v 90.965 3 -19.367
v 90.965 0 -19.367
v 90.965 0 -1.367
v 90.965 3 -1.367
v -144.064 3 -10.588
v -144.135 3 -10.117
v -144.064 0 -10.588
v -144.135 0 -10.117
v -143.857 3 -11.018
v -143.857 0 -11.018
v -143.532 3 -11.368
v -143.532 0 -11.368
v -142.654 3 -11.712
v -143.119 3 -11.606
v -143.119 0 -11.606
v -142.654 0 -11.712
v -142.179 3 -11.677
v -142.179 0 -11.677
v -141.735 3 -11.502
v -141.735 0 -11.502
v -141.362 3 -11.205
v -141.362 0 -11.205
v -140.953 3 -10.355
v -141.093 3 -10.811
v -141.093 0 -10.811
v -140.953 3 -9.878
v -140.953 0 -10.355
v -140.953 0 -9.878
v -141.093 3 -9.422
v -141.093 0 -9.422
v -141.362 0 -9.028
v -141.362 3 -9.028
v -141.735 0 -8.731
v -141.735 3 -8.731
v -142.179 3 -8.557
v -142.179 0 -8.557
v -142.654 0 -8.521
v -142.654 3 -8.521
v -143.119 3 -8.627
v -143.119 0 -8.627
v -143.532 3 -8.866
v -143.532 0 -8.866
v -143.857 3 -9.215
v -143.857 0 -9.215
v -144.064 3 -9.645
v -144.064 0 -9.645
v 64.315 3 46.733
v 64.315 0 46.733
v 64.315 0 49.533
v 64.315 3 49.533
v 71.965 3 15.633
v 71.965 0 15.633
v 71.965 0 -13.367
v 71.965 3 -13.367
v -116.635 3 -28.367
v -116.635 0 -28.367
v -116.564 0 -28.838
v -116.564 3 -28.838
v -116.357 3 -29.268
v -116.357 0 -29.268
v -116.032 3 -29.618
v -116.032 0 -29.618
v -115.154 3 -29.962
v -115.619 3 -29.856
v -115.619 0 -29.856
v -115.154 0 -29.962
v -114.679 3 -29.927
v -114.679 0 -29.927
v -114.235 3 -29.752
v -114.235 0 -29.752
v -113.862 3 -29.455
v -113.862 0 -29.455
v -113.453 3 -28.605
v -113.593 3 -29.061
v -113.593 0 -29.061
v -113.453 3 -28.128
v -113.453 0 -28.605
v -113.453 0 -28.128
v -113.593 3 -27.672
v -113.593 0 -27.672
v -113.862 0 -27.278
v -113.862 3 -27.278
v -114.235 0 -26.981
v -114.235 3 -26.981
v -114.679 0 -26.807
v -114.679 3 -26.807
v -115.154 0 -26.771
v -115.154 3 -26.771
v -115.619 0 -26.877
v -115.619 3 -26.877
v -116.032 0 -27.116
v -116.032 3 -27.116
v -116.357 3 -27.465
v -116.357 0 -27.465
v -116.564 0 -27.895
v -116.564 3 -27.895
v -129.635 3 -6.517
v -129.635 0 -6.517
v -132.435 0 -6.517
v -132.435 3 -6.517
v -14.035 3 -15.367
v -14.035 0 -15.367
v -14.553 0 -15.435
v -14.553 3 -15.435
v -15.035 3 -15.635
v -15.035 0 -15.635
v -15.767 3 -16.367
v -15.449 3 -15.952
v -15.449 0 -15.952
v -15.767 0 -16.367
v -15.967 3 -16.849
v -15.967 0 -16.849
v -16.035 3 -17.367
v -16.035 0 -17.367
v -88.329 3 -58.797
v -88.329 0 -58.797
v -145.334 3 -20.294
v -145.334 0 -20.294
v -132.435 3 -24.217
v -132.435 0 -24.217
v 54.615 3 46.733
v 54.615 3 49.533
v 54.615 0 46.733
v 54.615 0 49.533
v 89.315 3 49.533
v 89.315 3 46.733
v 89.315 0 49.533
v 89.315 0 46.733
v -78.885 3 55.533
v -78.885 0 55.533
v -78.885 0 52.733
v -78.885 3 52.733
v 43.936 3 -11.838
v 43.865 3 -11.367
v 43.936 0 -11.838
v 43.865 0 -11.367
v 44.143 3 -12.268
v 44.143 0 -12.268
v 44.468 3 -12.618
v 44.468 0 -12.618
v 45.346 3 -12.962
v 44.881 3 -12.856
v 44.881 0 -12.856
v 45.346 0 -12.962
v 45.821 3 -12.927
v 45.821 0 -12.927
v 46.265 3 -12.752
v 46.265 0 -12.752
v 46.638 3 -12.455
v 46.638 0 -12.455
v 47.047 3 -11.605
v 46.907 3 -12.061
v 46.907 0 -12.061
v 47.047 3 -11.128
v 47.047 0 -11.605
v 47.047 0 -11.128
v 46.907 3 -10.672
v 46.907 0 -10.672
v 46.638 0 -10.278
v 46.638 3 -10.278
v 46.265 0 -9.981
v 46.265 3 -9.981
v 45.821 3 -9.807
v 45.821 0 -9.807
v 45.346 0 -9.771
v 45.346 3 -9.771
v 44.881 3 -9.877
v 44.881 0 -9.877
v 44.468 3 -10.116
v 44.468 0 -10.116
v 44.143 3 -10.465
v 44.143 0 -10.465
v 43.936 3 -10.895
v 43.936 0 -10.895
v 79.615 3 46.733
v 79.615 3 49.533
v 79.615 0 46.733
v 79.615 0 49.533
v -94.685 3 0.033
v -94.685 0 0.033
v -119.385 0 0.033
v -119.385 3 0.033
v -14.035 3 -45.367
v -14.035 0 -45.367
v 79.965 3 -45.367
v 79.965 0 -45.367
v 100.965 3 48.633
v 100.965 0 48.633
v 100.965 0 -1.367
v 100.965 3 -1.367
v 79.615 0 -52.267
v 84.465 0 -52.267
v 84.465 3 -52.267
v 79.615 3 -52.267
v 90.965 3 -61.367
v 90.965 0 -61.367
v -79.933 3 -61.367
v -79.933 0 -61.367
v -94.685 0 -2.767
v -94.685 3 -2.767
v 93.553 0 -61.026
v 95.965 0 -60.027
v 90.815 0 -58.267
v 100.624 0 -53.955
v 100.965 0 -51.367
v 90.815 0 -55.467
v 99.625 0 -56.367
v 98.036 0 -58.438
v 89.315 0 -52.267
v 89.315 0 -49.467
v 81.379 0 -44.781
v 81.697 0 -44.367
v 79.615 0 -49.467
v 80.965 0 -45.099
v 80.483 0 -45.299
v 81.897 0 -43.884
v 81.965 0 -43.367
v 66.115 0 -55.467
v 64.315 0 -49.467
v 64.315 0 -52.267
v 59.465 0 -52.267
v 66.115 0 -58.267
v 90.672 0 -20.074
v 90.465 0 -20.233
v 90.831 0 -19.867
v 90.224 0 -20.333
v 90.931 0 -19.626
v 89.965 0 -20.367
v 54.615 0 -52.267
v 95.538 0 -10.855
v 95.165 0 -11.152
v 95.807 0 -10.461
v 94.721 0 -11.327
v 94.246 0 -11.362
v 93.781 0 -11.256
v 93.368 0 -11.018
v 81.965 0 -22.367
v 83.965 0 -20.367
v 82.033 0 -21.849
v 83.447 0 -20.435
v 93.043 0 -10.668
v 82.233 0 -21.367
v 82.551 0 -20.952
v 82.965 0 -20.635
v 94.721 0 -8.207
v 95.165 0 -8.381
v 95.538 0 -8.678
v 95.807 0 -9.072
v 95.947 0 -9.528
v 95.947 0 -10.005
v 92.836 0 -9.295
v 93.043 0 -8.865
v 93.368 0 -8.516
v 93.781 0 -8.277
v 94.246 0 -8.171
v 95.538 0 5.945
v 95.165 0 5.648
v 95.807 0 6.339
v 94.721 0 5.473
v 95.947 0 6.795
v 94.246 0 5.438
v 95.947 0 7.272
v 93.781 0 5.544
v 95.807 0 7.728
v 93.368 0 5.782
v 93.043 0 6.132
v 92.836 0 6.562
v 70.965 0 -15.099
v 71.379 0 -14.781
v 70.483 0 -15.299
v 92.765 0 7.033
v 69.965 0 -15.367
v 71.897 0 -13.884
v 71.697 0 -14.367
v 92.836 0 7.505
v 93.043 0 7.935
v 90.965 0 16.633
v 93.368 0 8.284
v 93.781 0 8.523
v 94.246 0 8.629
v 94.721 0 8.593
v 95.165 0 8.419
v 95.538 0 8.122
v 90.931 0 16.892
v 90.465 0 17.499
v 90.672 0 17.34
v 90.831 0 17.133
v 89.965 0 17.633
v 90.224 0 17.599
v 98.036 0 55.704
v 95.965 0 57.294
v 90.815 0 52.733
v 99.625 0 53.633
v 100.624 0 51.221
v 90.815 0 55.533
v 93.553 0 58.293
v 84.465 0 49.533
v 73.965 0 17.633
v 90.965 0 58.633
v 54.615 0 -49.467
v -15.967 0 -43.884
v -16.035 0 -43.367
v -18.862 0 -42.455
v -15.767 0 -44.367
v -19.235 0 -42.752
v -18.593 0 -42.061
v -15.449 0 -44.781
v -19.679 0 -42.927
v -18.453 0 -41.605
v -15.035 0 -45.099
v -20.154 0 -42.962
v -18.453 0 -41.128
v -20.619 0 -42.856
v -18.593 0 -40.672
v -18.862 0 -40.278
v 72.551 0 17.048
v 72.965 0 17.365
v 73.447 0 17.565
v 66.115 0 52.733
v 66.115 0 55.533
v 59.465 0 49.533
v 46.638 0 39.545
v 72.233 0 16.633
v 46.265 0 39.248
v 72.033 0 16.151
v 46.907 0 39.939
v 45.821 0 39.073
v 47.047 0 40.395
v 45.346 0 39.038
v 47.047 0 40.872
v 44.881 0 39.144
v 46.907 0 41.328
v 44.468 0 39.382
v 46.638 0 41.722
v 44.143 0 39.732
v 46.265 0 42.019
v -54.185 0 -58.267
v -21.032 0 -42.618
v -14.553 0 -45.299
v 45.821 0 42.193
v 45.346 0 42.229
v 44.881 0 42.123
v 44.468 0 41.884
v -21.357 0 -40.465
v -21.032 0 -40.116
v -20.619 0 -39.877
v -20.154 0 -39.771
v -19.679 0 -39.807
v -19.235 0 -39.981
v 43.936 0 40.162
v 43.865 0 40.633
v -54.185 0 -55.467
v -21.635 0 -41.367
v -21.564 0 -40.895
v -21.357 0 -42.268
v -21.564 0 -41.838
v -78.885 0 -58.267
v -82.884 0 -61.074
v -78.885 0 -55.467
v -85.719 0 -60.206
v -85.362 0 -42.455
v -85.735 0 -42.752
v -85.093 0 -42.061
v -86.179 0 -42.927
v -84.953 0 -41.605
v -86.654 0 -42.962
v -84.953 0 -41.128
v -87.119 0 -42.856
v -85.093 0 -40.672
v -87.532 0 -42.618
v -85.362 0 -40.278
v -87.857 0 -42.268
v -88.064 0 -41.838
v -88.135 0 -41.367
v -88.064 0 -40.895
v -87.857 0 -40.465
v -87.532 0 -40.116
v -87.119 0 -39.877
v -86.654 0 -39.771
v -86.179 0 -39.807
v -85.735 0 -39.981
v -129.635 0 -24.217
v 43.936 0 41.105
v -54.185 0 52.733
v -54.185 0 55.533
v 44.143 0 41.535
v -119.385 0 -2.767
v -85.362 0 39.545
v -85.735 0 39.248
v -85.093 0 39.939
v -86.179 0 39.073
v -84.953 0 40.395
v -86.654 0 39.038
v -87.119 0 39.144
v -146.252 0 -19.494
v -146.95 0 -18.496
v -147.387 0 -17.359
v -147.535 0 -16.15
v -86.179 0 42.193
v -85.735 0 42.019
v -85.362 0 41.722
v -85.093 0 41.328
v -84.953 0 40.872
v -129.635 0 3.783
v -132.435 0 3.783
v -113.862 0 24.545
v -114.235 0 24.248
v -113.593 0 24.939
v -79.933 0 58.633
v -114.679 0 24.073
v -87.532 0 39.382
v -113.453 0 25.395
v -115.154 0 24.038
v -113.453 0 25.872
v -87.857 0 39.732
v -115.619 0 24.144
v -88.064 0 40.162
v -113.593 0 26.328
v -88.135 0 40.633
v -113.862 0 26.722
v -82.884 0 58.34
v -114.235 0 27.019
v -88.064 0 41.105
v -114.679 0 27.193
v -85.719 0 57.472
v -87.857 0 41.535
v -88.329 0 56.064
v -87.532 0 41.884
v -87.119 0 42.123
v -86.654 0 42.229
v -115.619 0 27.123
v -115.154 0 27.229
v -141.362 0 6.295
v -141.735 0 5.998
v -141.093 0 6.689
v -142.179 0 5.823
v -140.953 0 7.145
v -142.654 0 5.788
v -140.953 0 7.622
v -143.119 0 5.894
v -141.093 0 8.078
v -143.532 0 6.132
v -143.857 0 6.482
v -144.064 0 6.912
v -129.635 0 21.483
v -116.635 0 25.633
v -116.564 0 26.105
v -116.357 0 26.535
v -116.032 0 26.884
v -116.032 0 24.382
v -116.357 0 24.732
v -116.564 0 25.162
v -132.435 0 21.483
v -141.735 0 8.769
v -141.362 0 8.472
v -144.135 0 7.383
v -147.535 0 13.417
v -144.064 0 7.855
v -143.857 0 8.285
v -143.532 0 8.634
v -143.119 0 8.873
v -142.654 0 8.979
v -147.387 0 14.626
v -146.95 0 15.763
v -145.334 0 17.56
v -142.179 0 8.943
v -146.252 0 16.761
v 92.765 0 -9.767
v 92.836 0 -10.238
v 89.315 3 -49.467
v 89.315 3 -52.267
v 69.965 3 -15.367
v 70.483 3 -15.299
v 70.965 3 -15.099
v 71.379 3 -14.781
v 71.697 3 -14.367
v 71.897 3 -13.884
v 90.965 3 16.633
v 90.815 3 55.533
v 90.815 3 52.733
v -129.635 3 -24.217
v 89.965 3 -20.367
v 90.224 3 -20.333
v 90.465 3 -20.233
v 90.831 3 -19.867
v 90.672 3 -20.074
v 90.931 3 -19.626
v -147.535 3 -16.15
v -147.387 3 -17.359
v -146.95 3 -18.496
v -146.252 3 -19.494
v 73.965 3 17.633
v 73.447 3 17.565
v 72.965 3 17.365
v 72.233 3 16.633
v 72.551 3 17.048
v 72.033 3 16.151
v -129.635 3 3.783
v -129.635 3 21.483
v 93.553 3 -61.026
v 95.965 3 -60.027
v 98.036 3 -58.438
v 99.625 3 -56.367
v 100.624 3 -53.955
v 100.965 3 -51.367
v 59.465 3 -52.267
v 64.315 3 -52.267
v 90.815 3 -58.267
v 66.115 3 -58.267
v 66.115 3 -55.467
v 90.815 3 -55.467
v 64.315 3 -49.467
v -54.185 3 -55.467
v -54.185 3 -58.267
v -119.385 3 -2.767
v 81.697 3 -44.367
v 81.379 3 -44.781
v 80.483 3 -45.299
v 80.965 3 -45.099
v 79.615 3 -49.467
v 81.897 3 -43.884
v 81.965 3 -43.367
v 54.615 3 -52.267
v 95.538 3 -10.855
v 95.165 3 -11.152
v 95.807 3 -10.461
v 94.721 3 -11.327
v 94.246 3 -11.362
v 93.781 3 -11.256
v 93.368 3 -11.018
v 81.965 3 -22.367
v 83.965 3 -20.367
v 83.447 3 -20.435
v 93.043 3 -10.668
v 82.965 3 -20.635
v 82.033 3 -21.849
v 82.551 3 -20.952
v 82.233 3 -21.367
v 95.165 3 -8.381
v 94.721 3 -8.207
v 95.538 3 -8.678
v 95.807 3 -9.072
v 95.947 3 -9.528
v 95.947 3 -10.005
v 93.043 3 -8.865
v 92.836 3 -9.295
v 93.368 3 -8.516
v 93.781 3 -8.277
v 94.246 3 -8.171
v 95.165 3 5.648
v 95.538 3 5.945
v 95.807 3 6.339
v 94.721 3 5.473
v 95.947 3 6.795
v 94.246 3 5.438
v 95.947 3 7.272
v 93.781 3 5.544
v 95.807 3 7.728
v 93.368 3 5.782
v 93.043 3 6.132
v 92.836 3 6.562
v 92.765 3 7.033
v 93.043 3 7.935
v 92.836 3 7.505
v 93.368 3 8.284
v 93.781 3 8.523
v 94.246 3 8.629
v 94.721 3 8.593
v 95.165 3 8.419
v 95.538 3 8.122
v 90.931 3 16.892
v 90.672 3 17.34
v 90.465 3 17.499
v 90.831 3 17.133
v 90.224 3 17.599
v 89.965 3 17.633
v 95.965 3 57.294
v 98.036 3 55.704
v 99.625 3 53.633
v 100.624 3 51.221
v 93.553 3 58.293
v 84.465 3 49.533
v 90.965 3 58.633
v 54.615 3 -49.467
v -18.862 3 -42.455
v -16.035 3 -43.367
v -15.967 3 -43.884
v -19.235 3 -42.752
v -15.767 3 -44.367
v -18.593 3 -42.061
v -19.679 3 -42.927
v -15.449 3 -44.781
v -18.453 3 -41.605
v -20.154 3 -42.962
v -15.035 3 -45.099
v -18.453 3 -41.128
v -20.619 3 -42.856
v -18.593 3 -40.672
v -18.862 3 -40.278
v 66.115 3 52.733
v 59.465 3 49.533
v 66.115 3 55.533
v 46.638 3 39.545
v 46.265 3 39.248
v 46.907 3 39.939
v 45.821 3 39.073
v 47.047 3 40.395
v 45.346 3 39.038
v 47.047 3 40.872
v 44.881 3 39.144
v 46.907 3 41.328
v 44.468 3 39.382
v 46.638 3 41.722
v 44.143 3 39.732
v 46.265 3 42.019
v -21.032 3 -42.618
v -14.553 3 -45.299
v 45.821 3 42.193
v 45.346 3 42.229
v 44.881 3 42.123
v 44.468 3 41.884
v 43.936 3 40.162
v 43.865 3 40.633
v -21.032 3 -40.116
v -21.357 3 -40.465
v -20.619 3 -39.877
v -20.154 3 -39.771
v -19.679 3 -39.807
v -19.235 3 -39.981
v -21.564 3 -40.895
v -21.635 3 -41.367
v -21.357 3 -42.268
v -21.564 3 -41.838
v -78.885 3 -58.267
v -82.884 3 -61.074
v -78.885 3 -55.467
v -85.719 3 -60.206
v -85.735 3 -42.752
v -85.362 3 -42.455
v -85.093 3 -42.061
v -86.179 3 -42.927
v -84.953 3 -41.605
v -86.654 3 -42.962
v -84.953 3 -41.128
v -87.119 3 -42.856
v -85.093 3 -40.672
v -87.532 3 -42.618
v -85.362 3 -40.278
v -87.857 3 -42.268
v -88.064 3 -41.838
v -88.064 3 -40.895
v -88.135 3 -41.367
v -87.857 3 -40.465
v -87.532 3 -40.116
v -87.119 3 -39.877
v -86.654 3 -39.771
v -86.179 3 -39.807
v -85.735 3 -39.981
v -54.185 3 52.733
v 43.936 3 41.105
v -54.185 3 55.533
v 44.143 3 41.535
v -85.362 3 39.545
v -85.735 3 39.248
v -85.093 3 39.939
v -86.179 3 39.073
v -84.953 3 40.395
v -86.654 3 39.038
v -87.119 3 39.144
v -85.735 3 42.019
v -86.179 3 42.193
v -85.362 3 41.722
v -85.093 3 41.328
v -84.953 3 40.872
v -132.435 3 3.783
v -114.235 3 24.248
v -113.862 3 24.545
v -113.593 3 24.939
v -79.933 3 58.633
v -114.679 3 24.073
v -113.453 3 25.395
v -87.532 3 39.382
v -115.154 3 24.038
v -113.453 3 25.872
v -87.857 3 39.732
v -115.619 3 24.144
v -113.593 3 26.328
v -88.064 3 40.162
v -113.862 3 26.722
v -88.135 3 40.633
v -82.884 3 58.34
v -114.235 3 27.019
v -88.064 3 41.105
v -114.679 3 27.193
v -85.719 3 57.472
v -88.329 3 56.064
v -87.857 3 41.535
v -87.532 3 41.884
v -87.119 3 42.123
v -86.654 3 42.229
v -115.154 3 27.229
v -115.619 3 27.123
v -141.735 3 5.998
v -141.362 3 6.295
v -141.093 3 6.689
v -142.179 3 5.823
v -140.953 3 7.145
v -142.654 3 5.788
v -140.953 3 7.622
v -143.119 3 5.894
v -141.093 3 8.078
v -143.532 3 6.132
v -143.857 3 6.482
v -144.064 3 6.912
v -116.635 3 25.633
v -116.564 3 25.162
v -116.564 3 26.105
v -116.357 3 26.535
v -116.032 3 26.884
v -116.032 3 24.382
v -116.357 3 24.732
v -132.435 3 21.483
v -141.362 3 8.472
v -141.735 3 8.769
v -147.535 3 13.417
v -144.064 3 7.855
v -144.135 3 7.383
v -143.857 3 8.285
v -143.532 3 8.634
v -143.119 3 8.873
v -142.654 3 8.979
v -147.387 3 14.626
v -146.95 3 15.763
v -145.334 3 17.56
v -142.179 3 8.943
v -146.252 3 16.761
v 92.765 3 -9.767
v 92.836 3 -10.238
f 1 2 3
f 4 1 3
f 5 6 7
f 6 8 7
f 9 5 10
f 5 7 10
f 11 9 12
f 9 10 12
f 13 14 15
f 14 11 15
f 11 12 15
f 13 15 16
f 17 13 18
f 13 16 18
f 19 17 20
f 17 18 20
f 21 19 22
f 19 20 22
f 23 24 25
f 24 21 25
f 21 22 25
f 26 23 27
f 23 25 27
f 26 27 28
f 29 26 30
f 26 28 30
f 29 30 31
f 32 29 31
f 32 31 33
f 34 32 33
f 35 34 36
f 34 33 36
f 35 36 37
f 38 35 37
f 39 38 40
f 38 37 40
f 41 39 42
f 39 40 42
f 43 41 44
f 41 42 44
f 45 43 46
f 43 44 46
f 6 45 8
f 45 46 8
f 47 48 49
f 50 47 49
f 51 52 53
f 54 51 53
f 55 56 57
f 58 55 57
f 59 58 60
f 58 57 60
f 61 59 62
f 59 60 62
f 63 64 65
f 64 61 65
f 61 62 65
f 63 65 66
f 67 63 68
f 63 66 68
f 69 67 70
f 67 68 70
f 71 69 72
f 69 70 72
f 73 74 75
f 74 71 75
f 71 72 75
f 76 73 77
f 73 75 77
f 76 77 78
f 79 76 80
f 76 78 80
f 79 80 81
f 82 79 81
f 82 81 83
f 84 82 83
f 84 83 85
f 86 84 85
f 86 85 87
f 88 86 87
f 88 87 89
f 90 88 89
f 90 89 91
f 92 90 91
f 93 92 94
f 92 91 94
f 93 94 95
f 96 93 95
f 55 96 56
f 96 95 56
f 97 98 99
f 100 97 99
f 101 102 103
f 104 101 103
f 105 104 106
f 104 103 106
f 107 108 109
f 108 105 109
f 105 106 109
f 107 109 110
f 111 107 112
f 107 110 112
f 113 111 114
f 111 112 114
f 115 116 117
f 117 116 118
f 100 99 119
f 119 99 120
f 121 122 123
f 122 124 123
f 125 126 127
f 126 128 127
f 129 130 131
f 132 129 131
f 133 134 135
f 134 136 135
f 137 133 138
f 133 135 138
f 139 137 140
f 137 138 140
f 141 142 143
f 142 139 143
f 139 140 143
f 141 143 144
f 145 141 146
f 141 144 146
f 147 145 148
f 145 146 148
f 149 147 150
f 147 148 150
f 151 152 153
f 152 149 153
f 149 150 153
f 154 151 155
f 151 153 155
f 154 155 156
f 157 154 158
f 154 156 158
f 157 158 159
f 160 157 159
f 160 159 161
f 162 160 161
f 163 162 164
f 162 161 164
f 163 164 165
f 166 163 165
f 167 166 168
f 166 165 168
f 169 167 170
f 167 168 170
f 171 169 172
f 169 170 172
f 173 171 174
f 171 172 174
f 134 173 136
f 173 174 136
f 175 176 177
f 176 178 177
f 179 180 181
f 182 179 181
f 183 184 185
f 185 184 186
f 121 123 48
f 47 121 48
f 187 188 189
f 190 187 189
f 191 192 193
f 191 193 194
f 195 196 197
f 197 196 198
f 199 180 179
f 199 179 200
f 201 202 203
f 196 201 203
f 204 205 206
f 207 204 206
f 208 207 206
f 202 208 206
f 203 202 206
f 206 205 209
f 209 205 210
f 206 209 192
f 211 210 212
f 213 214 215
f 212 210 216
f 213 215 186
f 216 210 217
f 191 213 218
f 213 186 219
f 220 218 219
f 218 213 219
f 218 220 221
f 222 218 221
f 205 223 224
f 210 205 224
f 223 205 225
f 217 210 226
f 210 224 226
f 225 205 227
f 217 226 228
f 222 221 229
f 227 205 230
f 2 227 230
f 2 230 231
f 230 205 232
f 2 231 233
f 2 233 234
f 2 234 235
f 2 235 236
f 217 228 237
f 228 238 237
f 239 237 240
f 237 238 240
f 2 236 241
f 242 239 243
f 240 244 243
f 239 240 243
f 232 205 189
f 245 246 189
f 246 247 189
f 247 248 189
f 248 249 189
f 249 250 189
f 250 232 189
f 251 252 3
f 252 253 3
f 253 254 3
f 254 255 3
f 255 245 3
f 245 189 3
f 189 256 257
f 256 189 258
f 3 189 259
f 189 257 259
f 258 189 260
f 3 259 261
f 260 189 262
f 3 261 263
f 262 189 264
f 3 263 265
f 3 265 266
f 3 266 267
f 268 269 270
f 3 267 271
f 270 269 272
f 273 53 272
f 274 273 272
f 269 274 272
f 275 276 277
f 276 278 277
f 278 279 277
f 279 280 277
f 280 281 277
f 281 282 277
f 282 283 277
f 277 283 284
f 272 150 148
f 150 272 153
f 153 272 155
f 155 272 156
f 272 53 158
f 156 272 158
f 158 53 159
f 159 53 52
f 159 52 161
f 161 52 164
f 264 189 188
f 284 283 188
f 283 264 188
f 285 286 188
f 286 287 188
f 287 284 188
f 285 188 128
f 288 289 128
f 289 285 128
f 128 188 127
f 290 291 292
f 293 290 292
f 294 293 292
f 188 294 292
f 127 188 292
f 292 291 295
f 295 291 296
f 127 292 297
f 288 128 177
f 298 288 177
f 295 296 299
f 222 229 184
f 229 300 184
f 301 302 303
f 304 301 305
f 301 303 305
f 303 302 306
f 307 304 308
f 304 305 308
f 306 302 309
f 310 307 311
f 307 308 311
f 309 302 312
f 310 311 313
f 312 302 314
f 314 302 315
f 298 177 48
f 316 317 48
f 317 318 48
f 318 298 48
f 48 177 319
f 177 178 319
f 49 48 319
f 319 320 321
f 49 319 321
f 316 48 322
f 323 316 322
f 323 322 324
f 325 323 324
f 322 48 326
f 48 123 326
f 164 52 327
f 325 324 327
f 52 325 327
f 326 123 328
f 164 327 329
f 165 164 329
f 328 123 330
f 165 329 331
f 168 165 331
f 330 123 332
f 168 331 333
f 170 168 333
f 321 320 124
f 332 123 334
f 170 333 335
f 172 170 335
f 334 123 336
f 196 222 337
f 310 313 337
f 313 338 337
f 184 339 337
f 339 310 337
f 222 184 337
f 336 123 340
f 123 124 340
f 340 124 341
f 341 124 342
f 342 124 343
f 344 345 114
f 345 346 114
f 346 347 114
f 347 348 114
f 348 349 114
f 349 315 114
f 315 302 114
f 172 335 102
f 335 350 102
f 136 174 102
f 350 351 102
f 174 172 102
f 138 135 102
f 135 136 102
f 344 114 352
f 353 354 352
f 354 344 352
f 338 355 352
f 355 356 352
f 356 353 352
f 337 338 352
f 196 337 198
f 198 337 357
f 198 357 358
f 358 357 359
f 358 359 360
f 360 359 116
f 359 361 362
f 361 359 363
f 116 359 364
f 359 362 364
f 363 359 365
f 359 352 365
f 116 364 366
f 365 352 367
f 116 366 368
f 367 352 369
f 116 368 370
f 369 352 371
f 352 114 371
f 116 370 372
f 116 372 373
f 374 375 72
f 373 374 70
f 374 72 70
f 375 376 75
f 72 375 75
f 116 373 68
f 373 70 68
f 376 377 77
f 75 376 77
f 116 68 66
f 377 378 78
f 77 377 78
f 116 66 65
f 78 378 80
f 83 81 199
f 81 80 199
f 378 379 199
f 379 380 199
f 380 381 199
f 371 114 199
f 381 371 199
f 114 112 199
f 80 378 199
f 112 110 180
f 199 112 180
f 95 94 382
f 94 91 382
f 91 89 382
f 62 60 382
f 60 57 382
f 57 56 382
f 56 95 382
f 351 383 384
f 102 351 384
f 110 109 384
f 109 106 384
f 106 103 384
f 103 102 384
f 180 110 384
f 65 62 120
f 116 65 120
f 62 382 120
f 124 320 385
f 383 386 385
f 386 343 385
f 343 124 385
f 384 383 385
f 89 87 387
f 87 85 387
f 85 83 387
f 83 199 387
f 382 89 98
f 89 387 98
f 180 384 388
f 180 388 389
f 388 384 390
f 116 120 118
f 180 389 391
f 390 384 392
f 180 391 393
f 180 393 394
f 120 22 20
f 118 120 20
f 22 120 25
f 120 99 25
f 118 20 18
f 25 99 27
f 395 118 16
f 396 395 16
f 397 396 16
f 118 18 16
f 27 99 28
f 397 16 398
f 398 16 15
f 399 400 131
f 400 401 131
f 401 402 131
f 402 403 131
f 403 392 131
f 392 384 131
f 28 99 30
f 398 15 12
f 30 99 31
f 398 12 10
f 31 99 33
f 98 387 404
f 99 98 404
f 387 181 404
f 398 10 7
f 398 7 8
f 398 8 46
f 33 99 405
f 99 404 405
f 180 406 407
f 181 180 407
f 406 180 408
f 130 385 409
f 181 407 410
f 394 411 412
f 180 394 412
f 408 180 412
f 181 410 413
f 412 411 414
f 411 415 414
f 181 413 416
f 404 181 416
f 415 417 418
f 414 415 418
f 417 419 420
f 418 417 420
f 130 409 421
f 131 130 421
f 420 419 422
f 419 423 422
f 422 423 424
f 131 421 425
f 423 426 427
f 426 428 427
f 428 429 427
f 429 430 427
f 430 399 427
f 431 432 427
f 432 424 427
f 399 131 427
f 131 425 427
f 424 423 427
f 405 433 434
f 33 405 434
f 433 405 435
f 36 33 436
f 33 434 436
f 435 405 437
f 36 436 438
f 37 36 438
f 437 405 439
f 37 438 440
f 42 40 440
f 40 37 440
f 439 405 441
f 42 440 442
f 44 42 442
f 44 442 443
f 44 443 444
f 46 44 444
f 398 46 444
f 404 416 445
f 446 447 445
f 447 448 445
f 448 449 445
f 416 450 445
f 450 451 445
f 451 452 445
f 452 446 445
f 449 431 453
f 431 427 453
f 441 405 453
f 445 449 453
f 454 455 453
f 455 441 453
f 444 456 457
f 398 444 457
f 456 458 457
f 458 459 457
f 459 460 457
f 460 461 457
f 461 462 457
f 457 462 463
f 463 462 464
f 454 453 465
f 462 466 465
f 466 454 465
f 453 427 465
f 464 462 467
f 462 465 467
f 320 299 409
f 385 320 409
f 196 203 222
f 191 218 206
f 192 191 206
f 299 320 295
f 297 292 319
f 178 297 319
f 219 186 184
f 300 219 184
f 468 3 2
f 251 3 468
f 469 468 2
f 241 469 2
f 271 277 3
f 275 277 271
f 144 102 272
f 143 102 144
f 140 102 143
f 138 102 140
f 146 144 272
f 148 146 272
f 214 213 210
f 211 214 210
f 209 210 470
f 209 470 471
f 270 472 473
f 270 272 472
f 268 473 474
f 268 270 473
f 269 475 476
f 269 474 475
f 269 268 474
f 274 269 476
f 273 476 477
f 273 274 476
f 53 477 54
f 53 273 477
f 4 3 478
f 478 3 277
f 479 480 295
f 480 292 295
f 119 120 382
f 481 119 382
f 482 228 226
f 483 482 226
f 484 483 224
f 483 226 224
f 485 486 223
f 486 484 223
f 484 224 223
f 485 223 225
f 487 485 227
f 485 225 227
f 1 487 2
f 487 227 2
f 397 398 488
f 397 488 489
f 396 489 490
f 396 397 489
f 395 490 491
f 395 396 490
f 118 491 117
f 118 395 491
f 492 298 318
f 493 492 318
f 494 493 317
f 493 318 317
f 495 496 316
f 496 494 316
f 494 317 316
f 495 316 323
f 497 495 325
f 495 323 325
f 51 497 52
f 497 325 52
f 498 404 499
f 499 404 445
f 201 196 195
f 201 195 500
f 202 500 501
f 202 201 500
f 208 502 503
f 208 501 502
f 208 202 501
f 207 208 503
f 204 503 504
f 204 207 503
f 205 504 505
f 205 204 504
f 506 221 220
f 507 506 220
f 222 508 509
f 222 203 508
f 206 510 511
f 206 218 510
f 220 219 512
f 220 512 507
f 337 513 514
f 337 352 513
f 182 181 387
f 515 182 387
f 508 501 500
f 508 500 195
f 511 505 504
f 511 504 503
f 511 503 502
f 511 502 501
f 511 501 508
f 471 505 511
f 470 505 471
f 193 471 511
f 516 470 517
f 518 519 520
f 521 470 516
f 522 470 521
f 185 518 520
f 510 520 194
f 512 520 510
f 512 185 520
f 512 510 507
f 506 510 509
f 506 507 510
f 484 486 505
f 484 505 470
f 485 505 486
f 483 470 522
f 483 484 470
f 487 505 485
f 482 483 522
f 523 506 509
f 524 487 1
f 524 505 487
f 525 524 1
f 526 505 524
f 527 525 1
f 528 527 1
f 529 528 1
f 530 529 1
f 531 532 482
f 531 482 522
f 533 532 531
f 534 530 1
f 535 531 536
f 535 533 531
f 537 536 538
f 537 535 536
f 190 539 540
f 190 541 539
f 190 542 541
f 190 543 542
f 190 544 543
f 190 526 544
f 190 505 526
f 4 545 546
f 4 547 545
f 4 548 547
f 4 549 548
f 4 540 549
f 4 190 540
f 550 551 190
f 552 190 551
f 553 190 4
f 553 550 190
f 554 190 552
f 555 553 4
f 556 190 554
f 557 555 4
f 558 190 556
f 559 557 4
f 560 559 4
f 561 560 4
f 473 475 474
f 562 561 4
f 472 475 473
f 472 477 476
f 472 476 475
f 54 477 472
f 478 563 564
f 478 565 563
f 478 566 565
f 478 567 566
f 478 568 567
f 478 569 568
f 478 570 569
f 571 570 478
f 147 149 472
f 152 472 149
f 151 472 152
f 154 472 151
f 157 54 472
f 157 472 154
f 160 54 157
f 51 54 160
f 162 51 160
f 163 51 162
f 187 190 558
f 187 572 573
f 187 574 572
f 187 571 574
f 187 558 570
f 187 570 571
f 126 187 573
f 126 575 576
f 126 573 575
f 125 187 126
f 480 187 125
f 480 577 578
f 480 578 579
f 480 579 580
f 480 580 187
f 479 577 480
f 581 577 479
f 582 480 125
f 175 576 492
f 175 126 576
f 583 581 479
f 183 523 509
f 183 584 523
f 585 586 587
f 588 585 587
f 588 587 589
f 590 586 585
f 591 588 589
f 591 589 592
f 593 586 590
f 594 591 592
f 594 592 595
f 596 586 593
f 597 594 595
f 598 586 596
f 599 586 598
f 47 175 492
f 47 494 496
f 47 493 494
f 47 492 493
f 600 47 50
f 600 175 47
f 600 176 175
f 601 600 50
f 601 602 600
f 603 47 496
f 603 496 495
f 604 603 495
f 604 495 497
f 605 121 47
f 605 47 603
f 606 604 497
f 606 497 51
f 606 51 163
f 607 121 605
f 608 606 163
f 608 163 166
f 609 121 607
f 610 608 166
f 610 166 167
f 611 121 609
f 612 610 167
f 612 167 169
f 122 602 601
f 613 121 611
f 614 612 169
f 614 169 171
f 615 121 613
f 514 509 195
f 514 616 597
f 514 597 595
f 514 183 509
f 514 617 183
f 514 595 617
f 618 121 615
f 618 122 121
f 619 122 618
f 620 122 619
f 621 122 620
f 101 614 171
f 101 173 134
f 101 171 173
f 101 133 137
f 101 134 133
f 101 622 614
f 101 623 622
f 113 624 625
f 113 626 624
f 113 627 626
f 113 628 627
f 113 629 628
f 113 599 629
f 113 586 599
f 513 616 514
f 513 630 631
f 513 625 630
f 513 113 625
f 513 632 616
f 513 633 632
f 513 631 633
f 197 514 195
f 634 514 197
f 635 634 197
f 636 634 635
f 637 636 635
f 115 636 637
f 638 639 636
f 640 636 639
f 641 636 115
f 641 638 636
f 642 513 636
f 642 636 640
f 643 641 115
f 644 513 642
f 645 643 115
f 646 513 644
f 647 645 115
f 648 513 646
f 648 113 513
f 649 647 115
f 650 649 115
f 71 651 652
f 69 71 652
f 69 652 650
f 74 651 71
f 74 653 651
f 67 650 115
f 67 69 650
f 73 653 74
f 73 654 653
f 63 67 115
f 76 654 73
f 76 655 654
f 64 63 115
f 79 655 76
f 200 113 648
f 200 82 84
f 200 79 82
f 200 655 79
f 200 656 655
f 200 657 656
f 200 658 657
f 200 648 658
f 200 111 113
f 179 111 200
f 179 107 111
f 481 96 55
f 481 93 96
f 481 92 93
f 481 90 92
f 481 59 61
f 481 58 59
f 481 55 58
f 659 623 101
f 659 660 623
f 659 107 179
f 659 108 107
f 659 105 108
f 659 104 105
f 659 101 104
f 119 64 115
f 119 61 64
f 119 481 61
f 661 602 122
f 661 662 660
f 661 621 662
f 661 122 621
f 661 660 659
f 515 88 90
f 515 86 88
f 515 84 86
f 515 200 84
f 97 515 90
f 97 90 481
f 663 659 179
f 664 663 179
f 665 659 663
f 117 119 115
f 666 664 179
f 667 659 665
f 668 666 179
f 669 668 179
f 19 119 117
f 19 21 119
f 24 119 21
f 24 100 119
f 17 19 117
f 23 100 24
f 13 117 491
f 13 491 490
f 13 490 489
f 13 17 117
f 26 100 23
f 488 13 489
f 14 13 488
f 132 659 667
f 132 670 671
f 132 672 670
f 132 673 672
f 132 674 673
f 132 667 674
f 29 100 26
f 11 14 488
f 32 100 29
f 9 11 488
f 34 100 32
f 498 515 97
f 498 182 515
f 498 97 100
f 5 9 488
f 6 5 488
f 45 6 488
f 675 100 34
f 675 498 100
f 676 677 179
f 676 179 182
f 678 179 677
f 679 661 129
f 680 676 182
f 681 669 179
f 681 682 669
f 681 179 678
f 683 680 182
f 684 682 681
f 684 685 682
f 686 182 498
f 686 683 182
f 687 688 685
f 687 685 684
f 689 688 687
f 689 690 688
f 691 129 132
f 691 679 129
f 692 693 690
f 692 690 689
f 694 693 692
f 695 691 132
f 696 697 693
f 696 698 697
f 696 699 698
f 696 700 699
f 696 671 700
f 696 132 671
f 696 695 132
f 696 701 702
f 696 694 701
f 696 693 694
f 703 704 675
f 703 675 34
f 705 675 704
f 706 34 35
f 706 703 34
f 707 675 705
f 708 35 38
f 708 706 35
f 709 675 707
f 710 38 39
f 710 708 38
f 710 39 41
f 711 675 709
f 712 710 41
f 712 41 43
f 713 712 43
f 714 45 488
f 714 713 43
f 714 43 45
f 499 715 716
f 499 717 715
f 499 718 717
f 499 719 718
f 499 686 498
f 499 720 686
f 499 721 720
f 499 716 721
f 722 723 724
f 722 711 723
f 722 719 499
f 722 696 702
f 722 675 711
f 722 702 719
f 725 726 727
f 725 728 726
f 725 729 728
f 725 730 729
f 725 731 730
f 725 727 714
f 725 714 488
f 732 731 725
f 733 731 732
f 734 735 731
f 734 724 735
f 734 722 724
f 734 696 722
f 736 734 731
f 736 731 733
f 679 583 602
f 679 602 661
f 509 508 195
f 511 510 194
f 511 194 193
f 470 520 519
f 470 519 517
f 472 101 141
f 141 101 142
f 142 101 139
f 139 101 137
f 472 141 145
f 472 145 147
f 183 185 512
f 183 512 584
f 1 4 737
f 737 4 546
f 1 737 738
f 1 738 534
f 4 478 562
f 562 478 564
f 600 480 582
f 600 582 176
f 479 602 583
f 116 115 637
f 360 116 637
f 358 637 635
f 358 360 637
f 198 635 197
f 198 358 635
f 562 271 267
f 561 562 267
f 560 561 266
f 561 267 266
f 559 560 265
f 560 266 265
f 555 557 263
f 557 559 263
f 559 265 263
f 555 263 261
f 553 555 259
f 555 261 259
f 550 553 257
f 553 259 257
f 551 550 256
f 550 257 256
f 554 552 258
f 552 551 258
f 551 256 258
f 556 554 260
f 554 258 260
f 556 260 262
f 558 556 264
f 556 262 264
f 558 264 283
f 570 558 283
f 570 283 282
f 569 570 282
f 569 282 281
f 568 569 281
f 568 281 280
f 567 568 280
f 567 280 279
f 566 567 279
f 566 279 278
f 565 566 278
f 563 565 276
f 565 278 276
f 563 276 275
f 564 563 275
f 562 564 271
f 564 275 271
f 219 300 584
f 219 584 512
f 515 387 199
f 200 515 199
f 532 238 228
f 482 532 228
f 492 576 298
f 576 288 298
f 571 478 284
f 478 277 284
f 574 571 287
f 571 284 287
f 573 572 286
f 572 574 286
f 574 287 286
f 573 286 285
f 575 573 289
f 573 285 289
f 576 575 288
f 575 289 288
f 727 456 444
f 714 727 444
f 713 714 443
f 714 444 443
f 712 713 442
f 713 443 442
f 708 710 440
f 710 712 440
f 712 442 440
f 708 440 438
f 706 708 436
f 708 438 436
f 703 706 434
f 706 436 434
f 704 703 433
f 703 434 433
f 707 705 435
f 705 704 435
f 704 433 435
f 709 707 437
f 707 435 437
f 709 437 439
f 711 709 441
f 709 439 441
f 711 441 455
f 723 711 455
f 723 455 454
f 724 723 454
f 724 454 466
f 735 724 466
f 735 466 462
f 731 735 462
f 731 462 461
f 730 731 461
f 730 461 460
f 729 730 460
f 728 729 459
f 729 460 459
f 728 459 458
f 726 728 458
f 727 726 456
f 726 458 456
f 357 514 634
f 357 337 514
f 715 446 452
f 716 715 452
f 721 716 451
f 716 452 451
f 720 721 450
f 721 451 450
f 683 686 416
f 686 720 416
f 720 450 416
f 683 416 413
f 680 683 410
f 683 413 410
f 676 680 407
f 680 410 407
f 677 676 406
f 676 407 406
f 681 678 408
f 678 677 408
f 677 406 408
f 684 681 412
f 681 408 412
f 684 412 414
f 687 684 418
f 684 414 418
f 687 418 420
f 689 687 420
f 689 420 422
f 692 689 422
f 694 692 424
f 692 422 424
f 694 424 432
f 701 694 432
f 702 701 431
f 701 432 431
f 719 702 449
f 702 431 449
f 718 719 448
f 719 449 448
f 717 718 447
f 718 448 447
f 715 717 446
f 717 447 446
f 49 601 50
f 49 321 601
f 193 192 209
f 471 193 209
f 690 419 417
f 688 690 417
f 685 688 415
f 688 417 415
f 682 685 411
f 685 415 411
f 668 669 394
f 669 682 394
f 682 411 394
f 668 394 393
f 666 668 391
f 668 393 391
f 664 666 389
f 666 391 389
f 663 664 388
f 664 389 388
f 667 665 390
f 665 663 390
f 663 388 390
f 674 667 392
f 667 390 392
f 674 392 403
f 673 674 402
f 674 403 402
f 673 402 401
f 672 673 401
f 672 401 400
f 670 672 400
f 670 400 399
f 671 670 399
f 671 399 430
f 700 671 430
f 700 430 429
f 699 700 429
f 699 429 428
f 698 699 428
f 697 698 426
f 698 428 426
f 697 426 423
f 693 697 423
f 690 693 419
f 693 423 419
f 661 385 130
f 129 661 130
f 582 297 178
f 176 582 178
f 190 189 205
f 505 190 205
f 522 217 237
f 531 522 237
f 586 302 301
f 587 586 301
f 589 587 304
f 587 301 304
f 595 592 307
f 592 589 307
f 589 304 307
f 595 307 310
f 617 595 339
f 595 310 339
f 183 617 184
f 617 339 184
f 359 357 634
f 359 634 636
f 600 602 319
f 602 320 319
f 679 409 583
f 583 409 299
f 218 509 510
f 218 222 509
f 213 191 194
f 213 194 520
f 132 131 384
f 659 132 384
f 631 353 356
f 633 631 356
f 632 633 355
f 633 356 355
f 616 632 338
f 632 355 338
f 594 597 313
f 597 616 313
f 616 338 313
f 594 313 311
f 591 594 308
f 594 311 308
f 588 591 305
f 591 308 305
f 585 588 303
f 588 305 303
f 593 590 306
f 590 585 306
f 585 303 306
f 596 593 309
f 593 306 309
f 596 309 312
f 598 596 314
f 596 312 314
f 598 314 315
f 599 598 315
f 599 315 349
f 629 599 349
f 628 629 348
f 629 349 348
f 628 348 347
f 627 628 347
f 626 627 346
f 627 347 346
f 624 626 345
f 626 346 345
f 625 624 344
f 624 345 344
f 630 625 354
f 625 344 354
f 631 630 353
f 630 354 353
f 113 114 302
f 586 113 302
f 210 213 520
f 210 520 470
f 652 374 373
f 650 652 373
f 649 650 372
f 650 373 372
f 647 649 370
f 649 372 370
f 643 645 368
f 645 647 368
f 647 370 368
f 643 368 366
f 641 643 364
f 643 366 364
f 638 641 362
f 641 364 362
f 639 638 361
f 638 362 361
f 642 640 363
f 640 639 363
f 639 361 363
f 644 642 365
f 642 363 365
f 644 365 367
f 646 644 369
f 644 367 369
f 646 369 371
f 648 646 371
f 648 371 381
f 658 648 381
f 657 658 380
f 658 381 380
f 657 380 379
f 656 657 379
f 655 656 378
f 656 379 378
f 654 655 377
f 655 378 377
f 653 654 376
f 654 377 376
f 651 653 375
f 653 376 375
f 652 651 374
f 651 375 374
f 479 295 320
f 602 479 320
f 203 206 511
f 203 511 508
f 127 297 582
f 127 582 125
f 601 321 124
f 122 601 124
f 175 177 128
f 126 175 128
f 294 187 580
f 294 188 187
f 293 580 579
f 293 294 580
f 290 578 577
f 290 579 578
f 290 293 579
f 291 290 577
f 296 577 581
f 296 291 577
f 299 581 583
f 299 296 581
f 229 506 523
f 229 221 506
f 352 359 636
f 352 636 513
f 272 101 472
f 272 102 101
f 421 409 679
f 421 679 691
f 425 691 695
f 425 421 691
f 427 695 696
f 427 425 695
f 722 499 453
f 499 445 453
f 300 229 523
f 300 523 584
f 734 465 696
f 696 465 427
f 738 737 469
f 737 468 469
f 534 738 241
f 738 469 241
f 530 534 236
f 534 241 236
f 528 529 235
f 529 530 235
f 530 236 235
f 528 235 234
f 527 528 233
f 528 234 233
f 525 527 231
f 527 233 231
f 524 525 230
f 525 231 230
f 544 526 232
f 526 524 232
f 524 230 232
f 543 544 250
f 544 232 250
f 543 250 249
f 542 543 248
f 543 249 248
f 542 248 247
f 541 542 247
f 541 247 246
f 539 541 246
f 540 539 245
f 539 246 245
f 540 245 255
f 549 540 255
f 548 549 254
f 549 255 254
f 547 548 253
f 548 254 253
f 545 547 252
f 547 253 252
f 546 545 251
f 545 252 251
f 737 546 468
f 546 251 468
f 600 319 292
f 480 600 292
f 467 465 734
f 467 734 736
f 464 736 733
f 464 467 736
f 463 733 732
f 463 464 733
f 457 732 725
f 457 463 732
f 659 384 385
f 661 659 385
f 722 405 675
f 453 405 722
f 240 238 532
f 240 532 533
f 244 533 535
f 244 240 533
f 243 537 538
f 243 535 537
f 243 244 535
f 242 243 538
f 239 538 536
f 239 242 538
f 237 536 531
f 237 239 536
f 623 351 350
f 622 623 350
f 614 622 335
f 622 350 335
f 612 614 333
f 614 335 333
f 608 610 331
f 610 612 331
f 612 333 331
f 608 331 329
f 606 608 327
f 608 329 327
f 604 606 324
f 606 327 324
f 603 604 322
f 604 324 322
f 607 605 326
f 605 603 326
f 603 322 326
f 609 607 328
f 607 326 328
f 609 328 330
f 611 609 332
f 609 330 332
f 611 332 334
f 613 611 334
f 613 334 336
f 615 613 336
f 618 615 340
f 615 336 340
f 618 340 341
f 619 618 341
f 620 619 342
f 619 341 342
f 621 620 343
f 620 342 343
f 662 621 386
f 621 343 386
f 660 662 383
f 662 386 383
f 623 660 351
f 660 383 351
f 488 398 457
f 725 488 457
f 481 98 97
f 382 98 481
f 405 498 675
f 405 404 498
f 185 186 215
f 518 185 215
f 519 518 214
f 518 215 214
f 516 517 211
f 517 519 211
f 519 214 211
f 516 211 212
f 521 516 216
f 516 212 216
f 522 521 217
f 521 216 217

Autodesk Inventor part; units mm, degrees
ref_plane "YZ Plane" through (0, 0, 0) normal (1, 0, 0) x (0, 1, 0)
ref_plane "XZ Plane" through (0, 0, 0) normal (0, 1, 0) x (-1, 0, 0)
ref_plane "XY Plane" through (0, 0, 0) normal (0, 0, 1) x (1, 0, 0)
sketch "Sketch1" plane through (0, 0, 0) normal (0, 1, 0) x (-1, 0, 0)
  line L0 (-100.9651, 48.6333) -> (-100.9651, -1.3667)
  line L1 (79.933, 58.6333) -> (-90.9651, 58.6333)
  line L2 (145.3335, 17.5604) -> (88.3289, 56.0635)
  line L3 (-100.9651, -1.3667) -> (-100.9651, -51.3667)
  circle A0 centre (115.0349, 25.6333) radius 1.6
  circle A1 centre (115.0349, -28.3667) radius 1.6
  circle A2 centre (142.5349, 7.3833) radius 1.6
  circle A3 centre (142.5349, -10.1167) radius 1.6
  circle A4 centre (-94.3651, -9.7667) radius 1.6
  circle A5 centre (-94.3651, 7.0333) radius 1.6
  line L4 (147.5349, -16.1504) -> (147.5349, 13.417)
  arc A6 (-100.9651, -51.3667) -> (-90.9651, -61.3667) centre (-90.9651, -51.3667) ccw
  arc A7 (-90.9651, 58.6333) -> (-100.9651, 48.6333) centre (-90.9651, 48.6333) ccw
  arc A8 (88.3289, 56.0635) -> (79.933, 58.6333) centre (79.933, 43.6333) ccw
  arc A9 (79.933, -61.3667) -> (88.3289, -58.7969) centre (79.933, -46.3667) ccw
  arc A10 (147.5349, 13.417) -> (145.3335, 17.5604) centre (142.5349, 13.417) ccw
  arc A11 (145.3335, -20.2938) -> (147.5349, -16.1504) centre (142.5349, -16.1504) ccw
  line L5 (-90.9651, -61.3667) -> (79.933, -61.3667)
  line L6 (88.3289, -58.7969) -> (145.3335, -20.2938)
  line L7 (-90.9651, -1.3667) -> (-90.9651, 16.6333)
  line L8 (-89.9651, 17.6333) -> (-73.9651, 17.6333)
  arc A12 (-71.9651, 15.6333) -> (-73.9651, 17.6333) centre (-73.9651, 15.6333) ccw
  arc A13 (-89.9651, 17.6333) -> (-90.9651, 16.6333) centre (-89.9651, 16.6333) ccw
  line L9 (-71.9651, 15.6333) -> (-71.9651, -13.3667)
  line L10 (-83.9651, -20.3667) -> (-89.9651, -20.3667)
  arc A14 (-90.9651, -19.3667) -> (-89.9651, -20.3667) centre (-89.9651, -19.3667) ccw
  line L11 (-90.9651, -19.3667) -> (-90.9651, -1.3667)
  line L12 (16.0349, -17.3667) -> (16.0349, -43.3667)
  arc A15 (14.0349, -45.3667) -> (16.0349, -43.3667) centre (14.0349, -43.3667) ccw
  line L13 (14.0349, -15.3667) -> (-69.9651, -15.3667)
  arc A16 (16.0349, -17.3667) -> (14.0349, -15.3667) centre (14.0349, -17.3667) ccw
  arc A17 (-71.9651, -13.3667) -> (-69.9651, -15.3667) centre (-69.9651, -13.3667) ccw
  line L14 (14.0349, -45.3667) -> (-79.9651, -45.3667)
  arc A18 (-81.9651, -43.3667) -> (-79.9651, -45.3667) centre (-79.9651, -43.3667) ccw
  line L15 (-81.9651, -43.3667) -> (-81.9651, -22.3667)
  arc A19 (-81.9651, -22.3667) -> (-83.9651, -20.3667) centre (-83.9651, -22.3667) ccw
  line L16 (-54.6151, -49.4667) -> (-64.3151, -49.4667)
  line L17 (-64.3151, -49.4667) -> (-64.3151, -52.2667)
  line L18 (-59.4651, -52.2667) -> (-54.6151, -52.2667)
  line L19 (-54.6151, -52.2667) -> (-54.6151, -49.4667)
  line L20 (-59.4651, -52.2667) -> (-64.3151, -52.2667)
  line L21 (-79.6151, -49.4667) -> (-89.3151, -49.4667)
  line L22 (-89.3151, -49.4667) -> (-89.3151, -52.2667)
  line L23 (-84.4651, -52.2667) -> (-79.6151, -52.2667)
  line L24 (-79.6151, -52.2667) -> (-79.6151, -49.4667)
  line L25 (-84.4651, -52.2667) -> (-89.3151, -52.2667)
  line L26 (-54.6151, 46.7333) -> (-64.3151, 46.7333)
  line L27 (-64.3151, 46.7333) -> (-64.3151, 49.5333)
  line L28 (-59.4651, 49.5333) -> (-54.6151, 49.5333)
  line L29 (-54.6151, 49.5333) -> (-54.6151, 46.7333)
  line L30 (-59.4651, 49.5333) -> (-64.3151, 49.5333)
  line L31 (-79.6151, 46.7333) -> (-89.3151, 46.7333)
  line L32 (-89.3151, 46.7333) -> (-89.3151, 49.5333)
  line L33 (-84.4651, 49.5333) -> (-79.6151, 49.5333)
  line L34 (-79.6151, 49.5333) -> (-79.6151, 46.7333)
  line L35 (-84.4651, 49.5333) -> (-89.3151, 49.5333)
  circle A20 centre (-45.4651, -11.3667) radius 1.6
  circle A21 centre (-45.4651, 40.6333) radius 1.6
  circle A22 centre (86.5349, 40.6333) radius 1.6
  circle A23 centre (20.0349, -41.3667) radius 1.6
  circle A24 centre (86.5349, -41.3667) radius 1.6
  line L36 (129.6349, -6.5167) -> (129.6349, -24.2167)
  line L37 (132.4349, -6.5167) -> (132.4349, -24.2167)
  line L38 (129.6349, 3.7833) -> (129.6349, 21.4833)
  line L39 (132.4349, 3.7833) -> (132.4349, 21.4833)
  line L40 (119.3849, -2.7667) -> (94.6849, -2.7667)
  line L41 (94.6849, 0.0333) -> (119.3849, 0.0333)
  line L42 (94.6849, 0.0333) -> (94.6849, -2.7667)
  line L43 (119.3849, 0.0333) -> (119.3849, -2.7667)
  line L44 (129.6349, -6.5167) -> (132.4349, -6.5167)
  line L45 (132.4349, -24.2167) -> (129.6349, -24.2167)
  line L46 (129.6349, 3.7833) -> (132.4349, 3.7833)
  line L47 (129.6349, 21.4833) -> (132.4349, 21.4833)
  line L48 (-90.8151, -58.2667) -> (-66.1151, -58.2667)
  line L49 (-66.1151, -58.2667) -> (-66.1151, -55.4667)
  line L50 (-66.1151, -55.4667) -> (-90.8151, -55.4667)
  line L51 (-90.8151, -55.4667) -> (-90.8151, -58.2667)
  line L52 (-90.8151, 55.5333) -> (-66.1151, 55.5333)
  line L53 (-66.1151, 55.5333) -> (-66.1151, 52.7333)
  line L54 (-66.1151, 52.7333) -> (-90.8151, 52.7333)
  line L55 (-90.8151, 52.7333) -> (-90.8151, 55.5333)
  line L56 (54.1849, 55.5333) -> (78.8849, 55.5333)
  line L57 (78.8849, 55.5333) -> (78.8849, 52.7333)
  line L58 (78.8849, 52.7333) -> (54.1849, 52.7333)
  line L59 (54.1849, 52.7333) -> (54.1849, 55.5333)
  line L60 (54.1849, -58.2667) -> (78.8849, -58.2667)
  line L61 (78.8849, -58.2667) -> (78.8849, -55.4667)
  line L62 (78.8849, -55.4667) -> (54.1849, -55.4667)
  line L63 (54.1849, -55.4667) -> (54.1849, -58.2667)
extrude "Extrusion1" add sketch "Sketch1" along normal blind 3
properties part number "base" material "Polycarbonate, Clear"
